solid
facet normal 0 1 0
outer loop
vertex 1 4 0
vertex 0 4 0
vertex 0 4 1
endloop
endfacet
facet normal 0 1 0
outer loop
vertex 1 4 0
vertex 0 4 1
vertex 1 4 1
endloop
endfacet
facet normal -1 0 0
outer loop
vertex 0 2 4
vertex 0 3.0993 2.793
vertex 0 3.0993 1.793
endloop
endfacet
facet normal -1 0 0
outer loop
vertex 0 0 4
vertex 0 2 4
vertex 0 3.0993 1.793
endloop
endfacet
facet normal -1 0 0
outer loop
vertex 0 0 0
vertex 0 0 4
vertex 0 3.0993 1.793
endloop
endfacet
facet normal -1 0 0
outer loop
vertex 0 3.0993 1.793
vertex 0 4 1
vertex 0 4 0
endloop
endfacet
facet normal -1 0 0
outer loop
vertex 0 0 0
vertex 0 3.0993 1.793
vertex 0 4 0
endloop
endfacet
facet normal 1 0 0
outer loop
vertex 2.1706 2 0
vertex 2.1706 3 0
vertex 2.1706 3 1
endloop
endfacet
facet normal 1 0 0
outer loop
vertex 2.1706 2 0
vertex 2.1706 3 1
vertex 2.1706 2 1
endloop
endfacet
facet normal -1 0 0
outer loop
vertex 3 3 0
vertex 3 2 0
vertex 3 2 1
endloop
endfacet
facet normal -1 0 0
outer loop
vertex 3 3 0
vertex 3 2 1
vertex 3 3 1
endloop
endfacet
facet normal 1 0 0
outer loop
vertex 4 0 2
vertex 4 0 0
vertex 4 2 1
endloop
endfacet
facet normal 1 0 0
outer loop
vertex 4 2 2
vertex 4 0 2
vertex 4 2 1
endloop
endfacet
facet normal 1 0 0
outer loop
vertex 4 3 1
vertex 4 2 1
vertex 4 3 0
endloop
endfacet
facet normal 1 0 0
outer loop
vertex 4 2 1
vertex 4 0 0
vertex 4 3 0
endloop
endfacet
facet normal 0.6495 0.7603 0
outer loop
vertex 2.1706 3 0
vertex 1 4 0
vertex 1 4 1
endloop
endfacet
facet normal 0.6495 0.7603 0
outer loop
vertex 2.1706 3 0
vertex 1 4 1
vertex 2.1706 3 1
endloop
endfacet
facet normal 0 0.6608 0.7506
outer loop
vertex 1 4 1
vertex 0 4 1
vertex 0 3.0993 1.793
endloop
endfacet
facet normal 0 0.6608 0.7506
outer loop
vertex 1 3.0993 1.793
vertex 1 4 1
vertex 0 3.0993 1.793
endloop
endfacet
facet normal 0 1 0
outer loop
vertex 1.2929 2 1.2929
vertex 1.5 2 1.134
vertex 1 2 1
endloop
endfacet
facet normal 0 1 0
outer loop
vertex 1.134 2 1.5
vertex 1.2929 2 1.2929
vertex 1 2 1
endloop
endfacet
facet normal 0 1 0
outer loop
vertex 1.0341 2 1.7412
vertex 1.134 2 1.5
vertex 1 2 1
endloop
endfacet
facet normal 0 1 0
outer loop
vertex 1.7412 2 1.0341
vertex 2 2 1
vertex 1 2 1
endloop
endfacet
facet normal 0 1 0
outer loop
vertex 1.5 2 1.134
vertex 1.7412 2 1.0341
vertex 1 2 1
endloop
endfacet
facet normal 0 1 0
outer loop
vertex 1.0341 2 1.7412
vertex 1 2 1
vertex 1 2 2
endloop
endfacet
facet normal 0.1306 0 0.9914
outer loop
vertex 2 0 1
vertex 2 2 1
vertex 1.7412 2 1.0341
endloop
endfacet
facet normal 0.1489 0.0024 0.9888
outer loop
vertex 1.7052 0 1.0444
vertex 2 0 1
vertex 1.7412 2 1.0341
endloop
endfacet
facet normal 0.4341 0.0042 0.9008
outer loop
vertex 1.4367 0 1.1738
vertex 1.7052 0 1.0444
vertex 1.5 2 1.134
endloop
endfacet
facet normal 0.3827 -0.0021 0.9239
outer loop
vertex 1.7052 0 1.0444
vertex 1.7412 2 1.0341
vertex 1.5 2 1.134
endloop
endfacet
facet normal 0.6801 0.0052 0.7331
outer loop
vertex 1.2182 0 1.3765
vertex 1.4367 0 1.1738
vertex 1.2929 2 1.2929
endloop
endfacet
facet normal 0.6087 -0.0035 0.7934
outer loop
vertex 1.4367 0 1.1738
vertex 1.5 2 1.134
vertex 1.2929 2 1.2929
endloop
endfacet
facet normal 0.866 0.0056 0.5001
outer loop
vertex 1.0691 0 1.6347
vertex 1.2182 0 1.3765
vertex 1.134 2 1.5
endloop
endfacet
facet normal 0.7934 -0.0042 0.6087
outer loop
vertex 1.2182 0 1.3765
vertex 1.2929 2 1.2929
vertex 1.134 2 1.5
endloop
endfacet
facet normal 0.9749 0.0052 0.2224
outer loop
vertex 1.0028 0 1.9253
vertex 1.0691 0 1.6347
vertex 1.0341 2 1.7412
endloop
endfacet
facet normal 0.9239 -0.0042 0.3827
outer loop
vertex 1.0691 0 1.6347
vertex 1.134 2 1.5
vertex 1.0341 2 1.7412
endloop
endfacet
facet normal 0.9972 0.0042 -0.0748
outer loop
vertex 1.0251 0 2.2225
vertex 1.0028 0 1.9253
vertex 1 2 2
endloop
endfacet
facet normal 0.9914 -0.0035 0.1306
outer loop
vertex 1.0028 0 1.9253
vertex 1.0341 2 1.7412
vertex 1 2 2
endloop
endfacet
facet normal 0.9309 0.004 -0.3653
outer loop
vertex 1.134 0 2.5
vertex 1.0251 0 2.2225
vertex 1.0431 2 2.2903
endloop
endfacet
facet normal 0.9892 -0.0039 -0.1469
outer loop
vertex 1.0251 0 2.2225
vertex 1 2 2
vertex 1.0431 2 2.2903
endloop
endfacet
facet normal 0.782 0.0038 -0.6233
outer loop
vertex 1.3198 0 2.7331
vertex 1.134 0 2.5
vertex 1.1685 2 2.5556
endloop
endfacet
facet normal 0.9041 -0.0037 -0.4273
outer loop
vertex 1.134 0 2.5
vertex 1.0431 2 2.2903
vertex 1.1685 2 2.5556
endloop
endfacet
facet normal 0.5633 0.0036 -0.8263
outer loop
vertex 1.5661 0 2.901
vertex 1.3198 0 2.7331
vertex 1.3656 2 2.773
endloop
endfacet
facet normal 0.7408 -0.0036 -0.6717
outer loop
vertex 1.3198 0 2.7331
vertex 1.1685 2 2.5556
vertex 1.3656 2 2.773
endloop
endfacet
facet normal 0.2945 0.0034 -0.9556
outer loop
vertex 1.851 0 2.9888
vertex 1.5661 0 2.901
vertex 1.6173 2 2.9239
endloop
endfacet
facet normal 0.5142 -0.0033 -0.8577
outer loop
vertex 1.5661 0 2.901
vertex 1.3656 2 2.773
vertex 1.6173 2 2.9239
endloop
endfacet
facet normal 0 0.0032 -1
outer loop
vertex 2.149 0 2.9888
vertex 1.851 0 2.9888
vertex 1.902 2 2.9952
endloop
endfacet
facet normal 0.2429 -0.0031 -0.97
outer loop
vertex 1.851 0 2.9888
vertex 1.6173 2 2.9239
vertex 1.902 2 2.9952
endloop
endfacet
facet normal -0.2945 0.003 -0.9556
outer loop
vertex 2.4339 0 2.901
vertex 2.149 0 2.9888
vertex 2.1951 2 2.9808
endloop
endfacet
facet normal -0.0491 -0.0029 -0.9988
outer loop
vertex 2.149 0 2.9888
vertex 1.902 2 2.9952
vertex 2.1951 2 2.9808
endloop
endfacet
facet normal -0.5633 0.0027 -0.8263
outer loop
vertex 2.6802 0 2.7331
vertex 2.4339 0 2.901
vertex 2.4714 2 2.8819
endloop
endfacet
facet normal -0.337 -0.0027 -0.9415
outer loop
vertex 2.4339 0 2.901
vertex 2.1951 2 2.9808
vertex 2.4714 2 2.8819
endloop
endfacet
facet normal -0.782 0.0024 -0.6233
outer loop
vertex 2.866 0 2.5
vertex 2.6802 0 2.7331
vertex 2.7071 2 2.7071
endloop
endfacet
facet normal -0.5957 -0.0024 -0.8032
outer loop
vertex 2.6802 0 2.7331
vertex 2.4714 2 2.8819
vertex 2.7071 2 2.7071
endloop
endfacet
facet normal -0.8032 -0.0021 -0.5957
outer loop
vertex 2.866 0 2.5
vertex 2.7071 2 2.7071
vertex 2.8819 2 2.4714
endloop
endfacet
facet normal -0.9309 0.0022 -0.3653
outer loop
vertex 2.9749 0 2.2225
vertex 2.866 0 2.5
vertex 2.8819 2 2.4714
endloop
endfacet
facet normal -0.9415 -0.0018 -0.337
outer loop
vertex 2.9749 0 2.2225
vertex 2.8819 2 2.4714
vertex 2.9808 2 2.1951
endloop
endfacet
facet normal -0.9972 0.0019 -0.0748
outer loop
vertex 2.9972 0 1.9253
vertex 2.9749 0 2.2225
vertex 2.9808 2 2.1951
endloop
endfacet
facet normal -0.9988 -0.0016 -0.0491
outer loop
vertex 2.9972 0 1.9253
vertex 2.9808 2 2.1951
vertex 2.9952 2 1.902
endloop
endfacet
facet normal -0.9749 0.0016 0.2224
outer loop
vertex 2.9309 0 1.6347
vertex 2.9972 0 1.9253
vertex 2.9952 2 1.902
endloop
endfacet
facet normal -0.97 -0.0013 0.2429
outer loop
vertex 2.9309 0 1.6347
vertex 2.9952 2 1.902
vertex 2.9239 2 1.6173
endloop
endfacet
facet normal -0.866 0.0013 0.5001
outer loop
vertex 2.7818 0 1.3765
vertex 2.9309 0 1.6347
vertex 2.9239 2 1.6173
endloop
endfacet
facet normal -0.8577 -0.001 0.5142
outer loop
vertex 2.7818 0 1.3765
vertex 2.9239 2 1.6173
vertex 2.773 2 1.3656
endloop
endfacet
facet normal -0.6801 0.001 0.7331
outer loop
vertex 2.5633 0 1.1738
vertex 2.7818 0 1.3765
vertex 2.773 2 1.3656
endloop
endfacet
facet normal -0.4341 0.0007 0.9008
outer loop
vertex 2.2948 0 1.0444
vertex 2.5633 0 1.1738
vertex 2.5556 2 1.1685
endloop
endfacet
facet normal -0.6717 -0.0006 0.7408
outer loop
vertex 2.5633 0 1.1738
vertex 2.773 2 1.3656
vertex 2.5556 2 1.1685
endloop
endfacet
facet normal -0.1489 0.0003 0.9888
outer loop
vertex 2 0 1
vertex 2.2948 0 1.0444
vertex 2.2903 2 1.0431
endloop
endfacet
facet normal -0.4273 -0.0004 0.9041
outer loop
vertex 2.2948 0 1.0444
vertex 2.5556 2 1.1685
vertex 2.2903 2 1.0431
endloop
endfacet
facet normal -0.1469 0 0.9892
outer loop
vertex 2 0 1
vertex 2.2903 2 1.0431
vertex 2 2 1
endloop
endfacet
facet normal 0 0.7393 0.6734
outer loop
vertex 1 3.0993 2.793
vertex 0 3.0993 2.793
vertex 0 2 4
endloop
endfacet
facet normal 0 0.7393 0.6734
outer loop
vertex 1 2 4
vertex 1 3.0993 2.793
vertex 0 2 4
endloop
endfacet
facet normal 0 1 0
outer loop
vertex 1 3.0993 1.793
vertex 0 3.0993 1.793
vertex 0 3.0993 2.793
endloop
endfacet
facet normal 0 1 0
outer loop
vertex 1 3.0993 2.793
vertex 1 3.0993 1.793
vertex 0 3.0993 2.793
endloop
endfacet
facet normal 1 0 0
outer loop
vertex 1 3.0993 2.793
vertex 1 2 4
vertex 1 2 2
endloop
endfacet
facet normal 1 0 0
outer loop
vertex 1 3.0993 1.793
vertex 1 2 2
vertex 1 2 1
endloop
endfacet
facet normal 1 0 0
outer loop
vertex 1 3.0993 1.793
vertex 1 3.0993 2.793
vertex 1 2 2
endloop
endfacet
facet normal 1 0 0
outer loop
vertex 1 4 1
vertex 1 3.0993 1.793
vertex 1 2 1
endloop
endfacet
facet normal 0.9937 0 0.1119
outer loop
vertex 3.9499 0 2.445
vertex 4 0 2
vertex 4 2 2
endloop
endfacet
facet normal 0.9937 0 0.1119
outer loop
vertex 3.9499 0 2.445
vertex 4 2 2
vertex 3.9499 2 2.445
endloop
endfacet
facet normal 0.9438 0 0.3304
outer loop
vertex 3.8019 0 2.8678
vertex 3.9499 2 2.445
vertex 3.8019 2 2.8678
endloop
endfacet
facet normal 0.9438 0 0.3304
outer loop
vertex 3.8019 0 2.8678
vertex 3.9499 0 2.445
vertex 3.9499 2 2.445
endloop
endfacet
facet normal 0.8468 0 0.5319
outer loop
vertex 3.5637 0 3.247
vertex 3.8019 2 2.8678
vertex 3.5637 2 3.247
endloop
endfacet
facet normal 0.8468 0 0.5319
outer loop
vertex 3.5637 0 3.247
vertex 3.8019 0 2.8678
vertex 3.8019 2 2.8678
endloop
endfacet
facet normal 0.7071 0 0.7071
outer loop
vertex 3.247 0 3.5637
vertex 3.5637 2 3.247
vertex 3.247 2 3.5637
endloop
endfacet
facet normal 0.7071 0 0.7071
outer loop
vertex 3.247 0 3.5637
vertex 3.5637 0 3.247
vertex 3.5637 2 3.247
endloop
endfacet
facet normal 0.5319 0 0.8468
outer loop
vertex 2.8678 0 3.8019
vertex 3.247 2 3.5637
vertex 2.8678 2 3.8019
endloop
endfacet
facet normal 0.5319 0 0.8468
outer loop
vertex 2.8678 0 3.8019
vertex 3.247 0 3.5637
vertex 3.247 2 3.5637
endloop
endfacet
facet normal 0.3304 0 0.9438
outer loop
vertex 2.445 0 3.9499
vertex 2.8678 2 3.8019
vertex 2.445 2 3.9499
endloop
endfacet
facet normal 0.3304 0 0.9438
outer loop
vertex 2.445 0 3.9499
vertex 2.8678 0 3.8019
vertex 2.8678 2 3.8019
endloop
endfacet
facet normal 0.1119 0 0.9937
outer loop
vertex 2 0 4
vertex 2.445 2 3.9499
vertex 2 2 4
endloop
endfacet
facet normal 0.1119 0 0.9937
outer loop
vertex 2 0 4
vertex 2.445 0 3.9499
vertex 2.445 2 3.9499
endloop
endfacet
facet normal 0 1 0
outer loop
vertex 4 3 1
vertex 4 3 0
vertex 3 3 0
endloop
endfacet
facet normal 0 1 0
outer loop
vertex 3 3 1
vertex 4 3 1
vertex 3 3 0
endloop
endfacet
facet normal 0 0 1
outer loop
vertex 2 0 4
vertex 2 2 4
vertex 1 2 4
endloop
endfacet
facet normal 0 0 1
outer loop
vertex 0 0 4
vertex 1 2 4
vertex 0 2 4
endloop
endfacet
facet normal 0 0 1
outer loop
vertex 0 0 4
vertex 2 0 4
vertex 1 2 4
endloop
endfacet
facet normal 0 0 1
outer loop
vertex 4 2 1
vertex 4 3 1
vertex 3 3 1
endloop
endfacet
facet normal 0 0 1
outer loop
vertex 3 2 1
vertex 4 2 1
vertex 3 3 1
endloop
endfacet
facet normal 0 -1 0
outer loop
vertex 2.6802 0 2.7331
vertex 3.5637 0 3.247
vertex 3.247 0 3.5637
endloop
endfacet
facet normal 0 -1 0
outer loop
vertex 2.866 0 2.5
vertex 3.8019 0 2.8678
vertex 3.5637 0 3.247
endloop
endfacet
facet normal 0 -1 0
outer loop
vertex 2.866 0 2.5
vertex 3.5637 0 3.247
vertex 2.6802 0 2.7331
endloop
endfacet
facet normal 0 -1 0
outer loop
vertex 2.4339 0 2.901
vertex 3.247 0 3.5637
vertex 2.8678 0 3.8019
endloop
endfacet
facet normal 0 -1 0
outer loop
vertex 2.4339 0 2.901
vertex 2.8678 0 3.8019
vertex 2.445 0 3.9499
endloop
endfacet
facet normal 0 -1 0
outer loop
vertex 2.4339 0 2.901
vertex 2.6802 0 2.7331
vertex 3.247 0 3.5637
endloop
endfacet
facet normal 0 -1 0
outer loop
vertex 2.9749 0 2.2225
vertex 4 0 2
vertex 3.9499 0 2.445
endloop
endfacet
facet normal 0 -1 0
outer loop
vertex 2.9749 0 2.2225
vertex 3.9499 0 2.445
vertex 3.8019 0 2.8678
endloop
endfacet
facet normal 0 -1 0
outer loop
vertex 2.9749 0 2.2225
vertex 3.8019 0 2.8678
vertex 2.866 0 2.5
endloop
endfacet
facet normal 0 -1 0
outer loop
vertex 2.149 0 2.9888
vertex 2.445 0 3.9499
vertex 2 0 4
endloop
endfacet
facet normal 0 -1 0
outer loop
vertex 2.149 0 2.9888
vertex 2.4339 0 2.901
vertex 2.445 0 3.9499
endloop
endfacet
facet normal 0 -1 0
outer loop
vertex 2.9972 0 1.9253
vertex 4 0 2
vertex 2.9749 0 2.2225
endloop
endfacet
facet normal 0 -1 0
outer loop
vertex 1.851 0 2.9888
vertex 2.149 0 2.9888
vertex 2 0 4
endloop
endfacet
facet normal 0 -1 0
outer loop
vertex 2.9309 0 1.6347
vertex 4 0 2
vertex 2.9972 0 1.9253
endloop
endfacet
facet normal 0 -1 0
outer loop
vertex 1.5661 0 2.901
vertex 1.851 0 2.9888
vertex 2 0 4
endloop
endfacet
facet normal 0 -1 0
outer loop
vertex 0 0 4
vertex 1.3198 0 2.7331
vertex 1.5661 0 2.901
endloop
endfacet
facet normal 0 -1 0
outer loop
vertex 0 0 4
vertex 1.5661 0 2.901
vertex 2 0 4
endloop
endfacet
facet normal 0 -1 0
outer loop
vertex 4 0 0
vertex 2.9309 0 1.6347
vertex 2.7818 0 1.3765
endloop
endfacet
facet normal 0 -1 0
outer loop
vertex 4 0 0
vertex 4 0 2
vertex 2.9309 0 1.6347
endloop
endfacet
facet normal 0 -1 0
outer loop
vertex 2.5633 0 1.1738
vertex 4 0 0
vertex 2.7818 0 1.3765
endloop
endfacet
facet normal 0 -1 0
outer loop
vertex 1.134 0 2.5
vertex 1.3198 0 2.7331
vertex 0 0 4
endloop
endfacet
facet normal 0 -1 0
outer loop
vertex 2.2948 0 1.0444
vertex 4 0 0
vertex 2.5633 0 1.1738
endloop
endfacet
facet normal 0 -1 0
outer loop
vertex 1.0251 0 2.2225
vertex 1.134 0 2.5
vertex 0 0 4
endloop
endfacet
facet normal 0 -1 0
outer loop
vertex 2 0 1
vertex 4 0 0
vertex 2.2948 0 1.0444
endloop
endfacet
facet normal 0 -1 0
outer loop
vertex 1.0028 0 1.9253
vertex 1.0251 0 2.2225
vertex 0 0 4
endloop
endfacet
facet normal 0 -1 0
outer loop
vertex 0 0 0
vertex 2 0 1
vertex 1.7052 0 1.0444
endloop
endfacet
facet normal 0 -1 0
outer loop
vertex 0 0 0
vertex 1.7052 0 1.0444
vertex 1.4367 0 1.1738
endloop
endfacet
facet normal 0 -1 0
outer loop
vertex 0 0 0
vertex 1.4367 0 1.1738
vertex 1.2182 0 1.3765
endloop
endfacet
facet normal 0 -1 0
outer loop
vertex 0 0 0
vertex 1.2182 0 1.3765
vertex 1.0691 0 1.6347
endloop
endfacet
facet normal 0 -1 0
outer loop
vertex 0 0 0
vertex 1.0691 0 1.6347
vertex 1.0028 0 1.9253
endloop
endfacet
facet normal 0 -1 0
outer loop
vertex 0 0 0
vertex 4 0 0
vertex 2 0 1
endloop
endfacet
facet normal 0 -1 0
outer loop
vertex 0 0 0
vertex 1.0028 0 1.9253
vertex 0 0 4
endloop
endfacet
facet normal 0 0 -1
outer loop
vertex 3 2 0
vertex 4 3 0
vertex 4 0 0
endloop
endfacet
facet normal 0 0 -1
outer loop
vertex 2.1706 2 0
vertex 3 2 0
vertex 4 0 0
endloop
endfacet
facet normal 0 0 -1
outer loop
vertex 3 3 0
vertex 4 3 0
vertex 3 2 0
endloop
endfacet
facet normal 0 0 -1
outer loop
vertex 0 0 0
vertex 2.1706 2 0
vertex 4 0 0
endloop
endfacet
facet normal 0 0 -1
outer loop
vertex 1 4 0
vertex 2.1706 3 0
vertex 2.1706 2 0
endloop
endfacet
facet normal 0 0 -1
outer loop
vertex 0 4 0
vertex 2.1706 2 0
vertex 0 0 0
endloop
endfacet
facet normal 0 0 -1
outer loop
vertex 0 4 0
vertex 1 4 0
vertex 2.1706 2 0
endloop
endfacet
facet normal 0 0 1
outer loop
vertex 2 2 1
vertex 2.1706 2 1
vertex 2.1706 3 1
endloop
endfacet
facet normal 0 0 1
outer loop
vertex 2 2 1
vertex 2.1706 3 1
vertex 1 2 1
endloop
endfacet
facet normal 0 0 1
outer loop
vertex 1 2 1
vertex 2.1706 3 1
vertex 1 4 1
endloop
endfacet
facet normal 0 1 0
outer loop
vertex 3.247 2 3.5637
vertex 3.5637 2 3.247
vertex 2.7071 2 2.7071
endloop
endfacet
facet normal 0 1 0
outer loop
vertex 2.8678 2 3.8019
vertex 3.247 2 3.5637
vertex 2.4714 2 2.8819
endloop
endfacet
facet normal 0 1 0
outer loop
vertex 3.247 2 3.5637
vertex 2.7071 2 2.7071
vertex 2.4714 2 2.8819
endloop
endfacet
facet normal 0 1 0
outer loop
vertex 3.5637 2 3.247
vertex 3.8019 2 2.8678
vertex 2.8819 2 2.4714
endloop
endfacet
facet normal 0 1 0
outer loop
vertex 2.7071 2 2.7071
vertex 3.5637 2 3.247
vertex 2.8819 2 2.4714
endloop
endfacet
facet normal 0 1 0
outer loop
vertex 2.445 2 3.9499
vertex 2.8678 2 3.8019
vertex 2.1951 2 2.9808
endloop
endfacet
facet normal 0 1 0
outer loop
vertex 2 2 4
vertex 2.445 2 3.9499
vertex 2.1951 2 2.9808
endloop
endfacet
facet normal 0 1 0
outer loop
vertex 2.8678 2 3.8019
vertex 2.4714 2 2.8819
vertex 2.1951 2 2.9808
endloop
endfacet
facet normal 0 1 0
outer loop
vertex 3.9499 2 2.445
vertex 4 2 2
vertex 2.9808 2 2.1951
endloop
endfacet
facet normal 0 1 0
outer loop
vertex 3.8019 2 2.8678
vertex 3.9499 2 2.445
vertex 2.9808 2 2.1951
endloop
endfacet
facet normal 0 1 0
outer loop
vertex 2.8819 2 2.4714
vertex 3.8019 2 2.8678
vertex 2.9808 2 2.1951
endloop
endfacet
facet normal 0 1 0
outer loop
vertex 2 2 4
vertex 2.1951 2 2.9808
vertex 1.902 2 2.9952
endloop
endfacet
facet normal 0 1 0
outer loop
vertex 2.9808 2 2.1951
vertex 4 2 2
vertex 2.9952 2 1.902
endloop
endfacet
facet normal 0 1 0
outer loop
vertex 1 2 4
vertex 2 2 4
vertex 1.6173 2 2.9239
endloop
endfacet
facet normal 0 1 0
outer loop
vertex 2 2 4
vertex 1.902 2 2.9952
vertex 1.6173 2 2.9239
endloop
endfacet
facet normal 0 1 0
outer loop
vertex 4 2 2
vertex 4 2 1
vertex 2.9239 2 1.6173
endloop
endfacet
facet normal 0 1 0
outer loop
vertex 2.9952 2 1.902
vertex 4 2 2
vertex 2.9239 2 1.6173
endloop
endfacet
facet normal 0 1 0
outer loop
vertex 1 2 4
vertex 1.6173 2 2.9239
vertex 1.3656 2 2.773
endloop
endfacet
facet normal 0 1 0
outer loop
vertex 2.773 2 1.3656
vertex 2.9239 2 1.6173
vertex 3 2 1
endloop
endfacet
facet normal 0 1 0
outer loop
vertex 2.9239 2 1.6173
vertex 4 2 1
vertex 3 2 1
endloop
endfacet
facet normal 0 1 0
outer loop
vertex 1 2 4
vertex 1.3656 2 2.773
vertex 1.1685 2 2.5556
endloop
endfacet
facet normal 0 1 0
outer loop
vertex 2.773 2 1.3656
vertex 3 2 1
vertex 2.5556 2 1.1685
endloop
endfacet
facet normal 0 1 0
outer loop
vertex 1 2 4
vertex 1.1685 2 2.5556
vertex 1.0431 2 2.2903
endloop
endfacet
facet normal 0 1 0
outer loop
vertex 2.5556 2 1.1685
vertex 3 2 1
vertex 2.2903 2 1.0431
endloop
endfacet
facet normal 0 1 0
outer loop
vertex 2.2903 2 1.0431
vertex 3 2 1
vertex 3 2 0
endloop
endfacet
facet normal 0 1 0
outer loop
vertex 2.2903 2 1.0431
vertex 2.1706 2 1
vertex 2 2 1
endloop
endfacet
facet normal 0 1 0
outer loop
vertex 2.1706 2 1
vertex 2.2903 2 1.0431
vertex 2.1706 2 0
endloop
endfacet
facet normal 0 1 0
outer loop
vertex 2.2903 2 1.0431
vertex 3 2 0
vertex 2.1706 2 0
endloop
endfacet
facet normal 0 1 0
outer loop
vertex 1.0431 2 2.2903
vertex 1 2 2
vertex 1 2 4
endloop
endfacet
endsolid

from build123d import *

# Parameters (mm, degrees)
EXTRUDE_1_DEPTH     = 2
SKETCH_2_W          = 1
SKETCH_2_H          = 1
EXTRUDE_2_DEPTH     = 1
EXTRUDE_3_DEPTH     = 1
SKETCH_4_R          = 1
CUT_EXTRUDE_1_DEPTH = 3


with BuildPart() as part:
    # 草圖1 → 填料-伸長1 (new body)
    with BuildSketch(Plane(origin=(0, 0, 0), x_dir=(1, 0, 0), z_dir=(0, 1, 0))):
        with BuildLine():
            Line((0, 0), (4, 0))
            Line((4, 0), (4, -2))
            ThreePointArc((4, -2), (3.414213562, -3.414213562), (2, -4))
            Line((2, -4), (0, -4))
            Line((0, -4), (0, 0))
        make_face()
    extrude(amount=EXTRUDE_1_DEPTH)

    # 草圖2 → 填料-伸長2 (add)
    with BuildSketch(Plane(origin=(0, 0, 0), x_dir=(-1, 0, 0), z_dir=(0, 0, -1))):
        with Locations((-3.5, 2.5)):
            Rectangle(SKETCH_2_W, SKETCH_2_H)
        Polygon((0, 2), (0, 4), (-1, 4), (-2.170585106, 3), (-2.170585106, 2), (-1.48690172, 2), align=None)
    extrude(amount=-EXTRUDE_2_DEPTH)

    # 草圖3 → 填料-伸長3 (add)
    with BuildSketch(Plane.ZY):
        Polygon((1, 4), (1.793034804, 3.099332456), (2.793034804, 3.099332456), (4, 2), (1, 2), align=None)
    extrude(amount=-EXTRUDE_3_DEPTH)

    # 草圖4 → 除料-伸長1 (cut)
    with BuildSketch(Plane(origin=(0, 2, 0), x_dir=(1, 0, 0), z_dir=(0, 1, 0))):
        with Locations(Location((2, -2, 0), (0, 0, 90))):
            Circle(SKETCH_4_R)
    extrude(amount=-CUT_EXTRUDE_1_DEPTH, mode=Mode.SUBTRACT)


solid = part.part
